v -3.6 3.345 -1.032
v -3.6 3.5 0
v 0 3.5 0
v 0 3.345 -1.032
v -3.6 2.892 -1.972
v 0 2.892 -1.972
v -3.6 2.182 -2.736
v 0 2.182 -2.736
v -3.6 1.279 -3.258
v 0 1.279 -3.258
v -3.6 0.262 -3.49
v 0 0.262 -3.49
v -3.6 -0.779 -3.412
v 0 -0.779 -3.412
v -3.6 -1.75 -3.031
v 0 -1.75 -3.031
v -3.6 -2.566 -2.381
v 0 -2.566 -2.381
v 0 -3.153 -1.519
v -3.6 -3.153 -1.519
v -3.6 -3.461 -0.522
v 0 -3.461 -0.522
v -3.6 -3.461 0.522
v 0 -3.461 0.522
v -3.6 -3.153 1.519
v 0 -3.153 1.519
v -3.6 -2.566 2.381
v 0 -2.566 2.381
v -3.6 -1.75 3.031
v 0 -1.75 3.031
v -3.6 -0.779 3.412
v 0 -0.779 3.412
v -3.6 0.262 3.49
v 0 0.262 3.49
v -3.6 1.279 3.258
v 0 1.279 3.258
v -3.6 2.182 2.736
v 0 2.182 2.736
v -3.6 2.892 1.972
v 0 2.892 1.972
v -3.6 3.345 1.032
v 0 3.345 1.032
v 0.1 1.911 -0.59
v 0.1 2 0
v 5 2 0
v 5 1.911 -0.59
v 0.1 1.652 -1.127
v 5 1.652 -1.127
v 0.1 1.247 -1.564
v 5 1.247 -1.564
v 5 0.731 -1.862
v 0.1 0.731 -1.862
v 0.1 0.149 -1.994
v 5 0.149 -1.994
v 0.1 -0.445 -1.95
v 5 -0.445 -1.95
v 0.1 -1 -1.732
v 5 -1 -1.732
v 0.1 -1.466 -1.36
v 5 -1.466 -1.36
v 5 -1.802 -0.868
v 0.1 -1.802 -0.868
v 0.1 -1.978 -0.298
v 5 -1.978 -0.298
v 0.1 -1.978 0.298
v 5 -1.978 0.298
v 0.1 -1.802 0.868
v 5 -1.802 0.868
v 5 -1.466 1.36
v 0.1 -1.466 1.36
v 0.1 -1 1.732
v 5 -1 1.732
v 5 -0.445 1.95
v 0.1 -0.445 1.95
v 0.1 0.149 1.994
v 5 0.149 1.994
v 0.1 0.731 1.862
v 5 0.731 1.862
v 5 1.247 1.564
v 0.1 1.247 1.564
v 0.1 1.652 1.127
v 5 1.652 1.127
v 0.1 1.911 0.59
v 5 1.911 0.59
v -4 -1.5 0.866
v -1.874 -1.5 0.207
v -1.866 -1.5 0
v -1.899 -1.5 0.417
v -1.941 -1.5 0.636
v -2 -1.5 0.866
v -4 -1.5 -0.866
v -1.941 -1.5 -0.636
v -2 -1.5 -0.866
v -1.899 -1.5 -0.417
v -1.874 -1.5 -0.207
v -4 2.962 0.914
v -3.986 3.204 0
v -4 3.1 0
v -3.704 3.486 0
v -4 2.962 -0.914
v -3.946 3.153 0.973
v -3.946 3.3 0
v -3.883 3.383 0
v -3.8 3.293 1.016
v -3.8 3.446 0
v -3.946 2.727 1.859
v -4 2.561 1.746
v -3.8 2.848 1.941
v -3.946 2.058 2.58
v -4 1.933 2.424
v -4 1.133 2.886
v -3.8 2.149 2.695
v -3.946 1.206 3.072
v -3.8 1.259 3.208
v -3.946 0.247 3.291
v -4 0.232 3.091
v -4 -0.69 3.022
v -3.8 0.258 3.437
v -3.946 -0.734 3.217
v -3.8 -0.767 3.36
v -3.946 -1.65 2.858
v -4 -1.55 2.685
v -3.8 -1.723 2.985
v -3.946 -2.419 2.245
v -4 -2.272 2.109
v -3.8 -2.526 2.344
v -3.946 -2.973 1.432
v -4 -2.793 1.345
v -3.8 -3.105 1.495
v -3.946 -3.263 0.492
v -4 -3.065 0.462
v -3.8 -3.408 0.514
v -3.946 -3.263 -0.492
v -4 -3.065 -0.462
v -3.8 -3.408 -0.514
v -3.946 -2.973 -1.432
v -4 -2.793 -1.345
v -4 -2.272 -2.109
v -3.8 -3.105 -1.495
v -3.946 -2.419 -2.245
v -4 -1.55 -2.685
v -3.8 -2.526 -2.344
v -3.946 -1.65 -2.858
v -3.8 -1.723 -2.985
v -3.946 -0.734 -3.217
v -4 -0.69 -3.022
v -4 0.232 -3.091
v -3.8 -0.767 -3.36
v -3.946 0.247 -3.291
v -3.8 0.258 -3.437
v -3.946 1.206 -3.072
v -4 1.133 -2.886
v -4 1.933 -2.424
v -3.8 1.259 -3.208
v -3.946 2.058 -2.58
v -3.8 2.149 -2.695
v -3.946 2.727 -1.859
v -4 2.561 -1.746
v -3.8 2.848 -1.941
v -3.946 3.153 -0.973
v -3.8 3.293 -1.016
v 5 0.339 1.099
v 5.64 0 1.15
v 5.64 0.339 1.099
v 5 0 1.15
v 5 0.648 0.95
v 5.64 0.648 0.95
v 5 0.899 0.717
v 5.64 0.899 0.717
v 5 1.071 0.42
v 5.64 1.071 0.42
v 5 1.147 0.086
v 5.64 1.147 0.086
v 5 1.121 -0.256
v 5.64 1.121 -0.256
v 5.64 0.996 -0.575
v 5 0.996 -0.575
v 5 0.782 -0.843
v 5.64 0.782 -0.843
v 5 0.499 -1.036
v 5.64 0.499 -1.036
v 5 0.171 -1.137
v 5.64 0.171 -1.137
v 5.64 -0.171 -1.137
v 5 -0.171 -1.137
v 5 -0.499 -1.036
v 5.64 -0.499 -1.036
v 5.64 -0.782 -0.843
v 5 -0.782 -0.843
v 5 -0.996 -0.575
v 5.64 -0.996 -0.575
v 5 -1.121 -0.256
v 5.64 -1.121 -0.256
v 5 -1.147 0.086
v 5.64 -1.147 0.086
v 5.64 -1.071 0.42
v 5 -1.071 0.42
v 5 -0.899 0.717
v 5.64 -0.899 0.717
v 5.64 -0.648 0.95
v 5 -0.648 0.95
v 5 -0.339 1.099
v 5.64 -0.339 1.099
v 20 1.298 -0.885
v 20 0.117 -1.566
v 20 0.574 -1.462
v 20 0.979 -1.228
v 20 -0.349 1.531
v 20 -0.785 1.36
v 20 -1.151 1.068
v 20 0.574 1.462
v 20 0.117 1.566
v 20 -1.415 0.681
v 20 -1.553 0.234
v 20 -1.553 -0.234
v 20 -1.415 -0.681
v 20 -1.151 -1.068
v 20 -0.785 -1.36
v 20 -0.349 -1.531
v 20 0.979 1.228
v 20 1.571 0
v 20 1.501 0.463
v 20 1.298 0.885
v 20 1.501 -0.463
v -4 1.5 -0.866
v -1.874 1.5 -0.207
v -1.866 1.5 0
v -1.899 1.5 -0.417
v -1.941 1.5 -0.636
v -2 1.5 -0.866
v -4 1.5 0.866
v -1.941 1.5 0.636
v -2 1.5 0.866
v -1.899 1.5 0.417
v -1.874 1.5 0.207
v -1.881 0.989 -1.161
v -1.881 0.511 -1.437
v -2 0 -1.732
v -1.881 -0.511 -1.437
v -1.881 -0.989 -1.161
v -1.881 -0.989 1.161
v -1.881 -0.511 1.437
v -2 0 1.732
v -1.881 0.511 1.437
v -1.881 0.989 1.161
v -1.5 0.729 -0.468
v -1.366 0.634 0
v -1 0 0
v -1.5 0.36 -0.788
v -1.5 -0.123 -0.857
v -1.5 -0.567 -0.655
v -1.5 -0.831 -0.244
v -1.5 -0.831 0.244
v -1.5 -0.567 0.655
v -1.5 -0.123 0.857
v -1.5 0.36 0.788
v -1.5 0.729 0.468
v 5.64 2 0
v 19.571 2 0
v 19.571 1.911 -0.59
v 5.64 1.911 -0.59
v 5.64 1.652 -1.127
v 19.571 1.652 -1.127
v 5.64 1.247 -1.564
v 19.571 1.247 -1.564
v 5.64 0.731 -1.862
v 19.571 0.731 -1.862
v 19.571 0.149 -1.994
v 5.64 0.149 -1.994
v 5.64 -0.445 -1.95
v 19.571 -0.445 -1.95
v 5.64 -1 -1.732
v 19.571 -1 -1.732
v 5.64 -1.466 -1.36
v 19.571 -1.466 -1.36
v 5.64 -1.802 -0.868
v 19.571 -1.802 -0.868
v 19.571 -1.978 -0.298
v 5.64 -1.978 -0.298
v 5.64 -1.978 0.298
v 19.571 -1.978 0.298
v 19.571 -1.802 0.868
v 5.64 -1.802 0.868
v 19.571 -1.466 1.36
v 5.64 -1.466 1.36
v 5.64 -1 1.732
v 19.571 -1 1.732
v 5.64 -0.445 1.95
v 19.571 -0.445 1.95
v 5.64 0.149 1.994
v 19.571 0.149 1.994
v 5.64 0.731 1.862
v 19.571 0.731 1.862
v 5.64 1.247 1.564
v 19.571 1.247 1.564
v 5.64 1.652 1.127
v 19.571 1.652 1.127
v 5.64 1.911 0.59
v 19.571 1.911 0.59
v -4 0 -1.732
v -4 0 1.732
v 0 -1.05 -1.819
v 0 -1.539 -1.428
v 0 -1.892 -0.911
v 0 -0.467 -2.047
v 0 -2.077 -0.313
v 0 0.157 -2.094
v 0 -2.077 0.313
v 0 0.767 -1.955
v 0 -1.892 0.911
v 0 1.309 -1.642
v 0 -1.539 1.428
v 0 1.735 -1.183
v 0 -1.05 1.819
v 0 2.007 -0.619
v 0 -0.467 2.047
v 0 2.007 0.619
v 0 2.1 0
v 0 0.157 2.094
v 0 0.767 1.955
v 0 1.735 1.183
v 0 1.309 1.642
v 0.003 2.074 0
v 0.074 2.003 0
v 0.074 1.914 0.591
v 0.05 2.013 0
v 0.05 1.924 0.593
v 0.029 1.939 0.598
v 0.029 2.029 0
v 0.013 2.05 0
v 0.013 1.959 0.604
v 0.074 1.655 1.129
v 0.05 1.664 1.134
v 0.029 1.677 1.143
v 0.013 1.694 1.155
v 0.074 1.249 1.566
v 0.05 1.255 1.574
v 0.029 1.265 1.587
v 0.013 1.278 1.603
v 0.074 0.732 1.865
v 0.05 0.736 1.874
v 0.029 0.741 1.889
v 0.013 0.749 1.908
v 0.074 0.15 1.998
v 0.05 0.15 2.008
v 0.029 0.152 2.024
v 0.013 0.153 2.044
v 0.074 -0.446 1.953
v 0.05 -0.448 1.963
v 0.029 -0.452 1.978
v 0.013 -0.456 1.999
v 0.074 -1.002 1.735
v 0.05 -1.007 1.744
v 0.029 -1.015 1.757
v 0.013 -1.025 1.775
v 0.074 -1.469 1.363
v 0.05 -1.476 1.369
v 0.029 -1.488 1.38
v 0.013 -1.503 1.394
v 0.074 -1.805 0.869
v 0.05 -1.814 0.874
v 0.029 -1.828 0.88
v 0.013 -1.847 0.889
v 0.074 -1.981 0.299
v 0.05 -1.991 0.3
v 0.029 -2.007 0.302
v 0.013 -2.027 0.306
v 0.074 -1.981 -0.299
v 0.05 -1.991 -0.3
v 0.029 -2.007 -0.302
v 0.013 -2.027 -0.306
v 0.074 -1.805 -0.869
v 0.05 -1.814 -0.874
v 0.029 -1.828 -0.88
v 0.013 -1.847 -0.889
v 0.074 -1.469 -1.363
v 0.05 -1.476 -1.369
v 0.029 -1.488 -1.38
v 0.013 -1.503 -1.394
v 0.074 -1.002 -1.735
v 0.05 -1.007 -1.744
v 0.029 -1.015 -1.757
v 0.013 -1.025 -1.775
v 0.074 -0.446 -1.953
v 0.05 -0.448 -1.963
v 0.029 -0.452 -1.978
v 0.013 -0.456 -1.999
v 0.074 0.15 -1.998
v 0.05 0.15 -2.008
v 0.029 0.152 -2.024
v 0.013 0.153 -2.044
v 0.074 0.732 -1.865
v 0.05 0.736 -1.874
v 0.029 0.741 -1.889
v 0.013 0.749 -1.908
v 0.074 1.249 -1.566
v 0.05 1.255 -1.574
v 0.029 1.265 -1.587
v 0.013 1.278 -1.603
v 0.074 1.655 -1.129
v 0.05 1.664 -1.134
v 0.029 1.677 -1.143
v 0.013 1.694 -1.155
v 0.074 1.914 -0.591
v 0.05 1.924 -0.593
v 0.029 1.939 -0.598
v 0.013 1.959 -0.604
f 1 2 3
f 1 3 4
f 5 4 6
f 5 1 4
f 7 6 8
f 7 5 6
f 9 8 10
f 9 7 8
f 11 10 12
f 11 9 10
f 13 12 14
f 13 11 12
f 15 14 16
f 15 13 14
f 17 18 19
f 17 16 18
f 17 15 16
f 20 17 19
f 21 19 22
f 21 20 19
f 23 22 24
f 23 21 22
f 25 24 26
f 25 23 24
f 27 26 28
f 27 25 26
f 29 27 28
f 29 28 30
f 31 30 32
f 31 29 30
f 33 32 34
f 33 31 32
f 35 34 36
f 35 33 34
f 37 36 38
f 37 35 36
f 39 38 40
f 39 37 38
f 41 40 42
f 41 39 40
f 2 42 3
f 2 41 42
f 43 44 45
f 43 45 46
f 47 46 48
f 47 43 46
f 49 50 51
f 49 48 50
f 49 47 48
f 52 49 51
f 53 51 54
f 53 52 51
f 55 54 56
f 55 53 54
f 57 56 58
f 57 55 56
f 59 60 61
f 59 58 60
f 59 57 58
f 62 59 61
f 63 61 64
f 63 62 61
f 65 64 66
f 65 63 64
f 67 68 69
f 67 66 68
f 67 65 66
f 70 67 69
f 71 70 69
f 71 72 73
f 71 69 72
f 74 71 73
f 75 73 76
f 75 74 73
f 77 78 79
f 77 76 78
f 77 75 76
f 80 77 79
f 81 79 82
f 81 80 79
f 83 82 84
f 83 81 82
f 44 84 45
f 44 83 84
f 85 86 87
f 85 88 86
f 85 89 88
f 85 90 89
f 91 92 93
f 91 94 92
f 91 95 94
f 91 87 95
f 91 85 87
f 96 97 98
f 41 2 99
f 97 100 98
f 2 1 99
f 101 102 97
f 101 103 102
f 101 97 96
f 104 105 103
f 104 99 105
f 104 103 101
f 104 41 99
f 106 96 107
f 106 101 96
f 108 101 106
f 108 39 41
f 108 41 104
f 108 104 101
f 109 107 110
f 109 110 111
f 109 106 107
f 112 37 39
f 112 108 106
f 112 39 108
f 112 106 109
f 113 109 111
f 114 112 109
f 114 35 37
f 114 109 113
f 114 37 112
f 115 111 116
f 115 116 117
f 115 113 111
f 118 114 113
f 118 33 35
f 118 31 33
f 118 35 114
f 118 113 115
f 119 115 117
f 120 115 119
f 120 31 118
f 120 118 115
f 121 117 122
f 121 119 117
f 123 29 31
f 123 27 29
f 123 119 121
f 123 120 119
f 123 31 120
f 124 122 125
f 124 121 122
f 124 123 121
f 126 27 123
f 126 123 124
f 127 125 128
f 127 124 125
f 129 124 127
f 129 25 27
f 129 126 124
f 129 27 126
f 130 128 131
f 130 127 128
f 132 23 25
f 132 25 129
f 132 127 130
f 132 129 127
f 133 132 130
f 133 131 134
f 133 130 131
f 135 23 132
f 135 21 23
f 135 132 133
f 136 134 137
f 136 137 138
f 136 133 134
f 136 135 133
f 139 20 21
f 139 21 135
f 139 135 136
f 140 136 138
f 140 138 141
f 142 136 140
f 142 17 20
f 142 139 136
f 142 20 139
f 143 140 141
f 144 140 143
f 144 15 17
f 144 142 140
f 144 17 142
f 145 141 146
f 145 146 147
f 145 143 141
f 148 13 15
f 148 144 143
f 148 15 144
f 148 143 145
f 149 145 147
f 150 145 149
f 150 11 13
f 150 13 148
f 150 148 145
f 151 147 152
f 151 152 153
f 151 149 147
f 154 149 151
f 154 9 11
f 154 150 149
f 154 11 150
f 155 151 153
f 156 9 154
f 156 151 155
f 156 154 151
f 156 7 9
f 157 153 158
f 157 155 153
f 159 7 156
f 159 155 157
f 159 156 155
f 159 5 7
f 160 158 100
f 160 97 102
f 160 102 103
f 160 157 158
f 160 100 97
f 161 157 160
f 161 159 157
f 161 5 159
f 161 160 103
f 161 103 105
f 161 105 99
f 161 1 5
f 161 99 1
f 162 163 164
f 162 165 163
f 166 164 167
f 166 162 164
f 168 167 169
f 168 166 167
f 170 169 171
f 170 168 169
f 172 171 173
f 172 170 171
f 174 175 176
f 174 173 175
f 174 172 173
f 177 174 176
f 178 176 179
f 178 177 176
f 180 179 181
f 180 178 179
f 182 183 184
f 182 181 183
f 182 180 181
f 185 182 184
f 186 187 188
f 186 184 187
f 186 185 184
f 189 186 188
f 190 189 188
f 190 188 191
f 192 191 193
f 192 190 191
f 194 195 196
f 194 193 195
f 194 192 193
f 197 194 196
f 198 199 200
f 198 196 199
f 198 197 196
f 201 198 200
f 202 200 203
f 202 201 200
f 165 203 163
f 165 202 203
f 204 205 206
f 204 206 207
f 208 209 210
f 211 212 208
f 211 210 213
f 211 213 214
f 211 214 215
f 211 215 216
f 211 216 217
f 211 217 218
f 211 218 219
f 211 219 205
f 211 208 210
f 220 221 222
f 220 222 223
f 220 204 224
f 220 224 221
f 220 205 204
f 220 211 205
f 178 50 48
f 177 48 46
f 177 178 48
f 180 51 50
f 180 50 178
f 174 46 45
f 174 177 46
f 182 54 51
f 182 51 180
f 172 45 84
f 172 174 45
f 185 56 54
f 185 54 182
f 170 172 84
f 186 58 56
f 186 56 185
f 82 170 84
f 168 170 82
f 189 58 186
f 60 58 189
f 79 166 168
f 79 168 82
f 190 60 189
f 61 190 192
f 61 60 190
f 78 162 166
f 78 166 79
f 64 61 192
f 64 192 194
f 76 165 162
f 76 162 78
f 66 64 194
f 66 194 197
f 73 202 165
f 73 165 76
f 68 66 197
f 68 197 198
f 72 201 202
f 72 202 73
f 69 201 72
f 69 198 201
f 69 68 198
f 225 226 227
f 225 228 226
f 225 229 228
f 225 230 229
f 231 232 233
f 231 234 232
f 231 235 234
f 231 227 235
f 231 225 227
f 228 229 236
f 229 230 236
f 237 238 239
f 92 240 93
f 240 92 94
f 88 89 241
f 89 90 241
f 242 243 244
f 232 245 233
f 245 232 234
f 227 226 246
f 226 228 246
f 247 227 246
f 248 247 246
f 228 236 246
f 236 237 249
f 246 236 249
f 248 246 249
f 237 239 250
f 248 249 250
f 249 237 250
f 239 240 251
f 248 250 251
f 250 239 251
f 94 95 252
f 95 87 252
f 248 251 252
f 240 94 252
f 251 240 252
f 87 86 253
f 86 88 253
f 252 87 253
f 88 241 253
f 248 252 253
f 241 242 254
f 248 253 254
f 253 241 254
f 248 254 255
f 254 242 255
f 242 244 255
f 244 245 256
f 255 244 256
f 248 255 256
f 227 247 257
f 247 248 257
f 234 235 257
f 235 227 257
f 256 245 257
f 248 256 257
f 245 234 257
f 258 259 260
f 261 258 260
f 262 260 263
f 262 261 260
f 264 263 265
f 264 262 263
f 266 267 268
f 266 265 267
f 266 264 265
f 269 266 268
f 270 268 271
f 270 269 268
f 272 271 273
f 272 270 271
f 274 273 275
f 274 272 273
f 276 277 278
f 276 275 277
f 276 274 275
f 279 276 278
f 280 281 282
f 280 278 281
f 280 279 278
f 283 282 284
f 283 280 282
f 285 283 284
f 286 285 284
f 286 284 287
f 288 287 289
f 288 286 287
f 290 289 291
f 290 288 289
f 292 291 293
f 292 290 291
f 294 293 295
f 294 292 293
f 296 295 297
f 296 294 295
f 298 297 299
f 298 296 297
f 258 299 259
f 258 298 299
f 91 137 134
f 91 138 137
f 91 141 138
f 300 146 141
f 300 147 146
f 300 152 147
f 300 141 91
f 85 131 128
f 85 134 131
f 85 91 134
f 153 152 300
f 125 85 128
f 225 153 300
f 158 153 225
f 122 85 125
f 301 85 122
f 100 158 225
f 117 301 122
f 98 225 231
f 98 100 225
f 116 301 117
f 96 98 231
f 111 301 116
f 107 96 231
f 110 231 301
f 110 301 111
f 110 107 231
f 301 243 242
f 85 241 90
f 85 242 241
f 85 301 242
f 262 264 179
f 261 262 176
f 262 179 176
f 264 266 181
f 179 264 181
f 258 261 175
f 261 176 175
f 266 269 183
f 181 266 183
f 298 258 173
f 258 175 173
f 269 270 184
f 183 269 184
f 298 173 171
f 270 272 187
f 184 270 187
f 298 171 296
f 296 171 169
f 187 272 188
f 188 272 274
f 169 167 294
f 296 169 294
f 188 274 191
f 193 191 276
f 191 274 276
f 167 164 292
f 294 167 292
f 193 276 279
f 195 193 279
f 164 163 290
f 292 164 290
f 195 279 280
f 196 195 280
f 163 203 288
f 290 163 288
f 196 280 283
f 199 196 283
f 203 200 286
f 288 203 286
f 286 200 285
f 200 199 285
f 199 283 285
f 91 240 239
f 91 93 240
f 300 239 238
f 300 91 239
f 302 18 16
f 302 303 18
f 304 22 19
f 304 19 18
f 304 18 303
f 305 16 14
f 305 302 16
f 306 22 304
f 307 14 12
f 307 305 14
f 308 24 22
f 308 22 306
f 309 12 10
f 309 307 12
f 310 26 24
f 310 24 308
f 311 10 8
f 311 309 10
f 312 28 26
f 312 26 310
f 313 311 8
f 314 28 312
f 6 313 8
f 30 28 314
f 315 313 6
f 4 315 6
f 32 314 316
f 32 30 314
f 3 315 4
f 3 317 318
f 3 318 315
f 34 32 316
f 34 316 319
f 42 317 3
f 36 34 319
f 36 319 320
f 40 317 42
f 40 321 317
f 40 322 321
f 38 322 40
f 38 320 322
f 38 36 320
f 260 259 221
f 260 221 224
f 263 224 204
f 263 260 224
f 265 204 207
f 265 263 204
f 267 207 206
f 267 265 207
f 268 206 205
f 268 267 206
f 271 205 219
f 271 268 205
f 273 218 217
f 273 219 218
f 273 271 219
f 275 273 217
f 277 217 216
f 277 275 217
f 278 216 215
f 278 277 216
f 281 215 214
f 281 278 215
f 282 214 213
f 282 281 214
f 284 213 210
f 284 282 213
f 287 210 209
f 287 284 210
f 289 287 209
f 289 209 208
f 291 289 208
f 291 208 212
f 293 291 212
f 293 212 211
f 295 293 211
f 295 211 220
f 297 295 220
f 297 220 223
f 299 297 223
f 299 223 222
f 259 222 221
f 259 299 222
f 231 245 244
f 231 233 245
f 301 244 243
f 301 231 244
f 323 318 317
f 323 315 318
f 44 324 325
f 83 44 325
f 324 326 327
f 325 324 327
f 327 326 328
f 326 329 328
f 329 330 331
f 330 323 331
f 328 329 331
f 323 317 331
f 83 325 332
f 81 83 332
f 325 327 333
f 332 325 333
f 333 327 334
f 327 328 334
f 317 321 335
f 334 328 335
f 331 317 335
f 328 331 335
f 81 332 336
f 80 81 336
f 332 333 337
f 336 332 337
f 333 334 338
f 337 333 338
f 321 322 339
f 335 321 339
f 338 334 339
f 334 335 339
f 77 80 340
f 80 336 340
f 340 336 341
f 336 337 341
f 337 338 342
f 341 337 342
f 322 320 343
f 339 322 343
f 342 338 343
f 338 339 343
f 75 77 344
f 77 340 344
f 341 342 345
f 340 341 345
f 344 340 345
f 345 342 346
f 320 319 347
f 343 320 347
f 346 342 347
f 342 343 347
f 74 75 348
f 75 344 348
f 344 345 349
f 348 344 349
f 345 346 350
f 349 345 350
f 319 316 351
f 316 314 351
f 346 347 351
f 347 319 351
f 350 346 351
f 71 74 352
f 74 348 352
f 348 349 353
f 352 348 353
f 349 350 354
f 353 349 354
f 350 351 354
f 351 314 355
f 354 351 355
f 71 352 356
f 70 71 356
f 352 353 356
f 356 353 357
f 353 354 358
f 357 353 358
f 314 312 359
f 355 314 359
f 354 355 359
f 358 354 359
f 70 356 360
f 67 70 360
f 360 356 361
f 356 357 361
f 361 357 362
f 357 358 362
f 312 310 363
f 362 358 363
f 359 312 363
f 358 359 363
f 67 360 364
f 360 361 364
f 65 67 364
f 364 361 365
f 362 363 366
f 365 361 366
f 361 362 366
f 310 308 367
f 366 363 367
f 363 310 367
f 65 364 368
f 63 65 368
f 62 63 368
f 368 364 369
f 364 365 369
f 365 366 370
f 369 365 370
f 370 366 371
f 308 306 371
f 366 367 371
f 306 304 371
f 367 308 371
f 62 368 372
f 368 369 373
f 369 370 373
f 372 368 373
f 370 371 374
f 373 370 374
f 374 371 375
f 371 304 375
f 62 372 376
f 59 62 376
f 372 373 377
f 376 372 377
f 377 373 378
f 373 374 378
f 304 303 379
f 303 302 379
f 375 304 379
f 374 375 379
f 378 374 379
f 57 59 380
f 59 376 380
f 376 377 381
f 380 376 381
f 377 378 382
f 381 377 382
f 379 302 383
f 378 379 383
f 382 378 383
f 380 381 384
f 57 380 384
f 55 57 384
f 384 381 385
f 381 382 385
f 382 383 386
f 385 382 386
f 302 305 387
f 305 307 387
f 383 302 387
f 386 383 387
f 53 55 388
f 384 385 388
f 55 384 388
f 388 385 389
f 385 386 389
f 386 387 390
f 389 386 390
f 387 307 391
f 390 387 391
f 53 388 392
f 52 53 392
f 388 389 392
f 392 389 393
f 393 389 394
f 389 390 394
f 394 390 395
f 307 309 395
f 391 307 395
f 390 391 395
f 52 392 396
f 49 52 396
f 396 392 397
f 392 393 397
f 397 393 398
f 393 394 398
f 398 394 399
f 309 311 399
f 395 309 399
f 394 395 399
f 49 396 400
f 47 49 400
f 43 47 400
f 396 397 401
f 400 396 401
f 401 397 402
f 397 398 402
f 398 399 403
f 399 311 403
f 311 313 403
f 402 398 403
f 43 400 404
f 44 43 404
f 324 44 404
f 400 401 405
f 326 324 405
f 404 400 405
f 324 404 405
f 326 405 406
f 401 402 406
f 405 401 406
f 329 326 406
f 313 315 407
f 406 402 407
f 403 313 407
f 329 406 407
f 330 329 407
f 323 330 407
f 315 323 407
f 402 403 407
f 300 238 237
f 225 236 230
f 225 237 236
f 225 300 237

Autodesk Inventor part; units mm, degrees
ref_plane "YZ Plane" through (0, 0, 0) normal (1, 0, 0) x (0, 1, 0)
ref_plane "XZ Plane" through (0, 0, 0) normal (0, 1, 0) x (-1, 0, 0)
sketch "Skizze1" plane through (0, 0, 0) normal (0, 0, 1) x (1, 0, 0)
  line L0 (-1, 0) -> (20, 0)
  line L1 (20, 0) -> (20, 2)
  line L2 (20, 2) -> (1.75, 2)
  line L3 (1.75, 2) -> (1.3205, 2)
  line L4 (1.3205, 2) -> (0, 2)
  line L5 (0, 2) -> (0, 3.5)
  line L6 (0, 3.5) -> (-4, 3.5)
  line L7 (-4, 3.5) -> (-4, 1.7321)
  line L8 (-4, 1.7321) -> (-2, 1.7321)
  line L9 (-2, 1.7321) -> (-1, 0)
  line L10 (-8.8, 0) -> (24.8, 0) projected
  line L11 (0, -0.7) -> (0, 4.2) projected
  line L12 (1.75, 2) -> (0, 2) construction
  dimension "d1" = 18.25
  dimension "d2" = 0.4295
  dimension "d3" = 4
  dimension "d4" = 2
  dimension "d5" = 60
  dimension "d6" = 4
  dimension "d7" = 4
  dimension "d8" = 3.4641
  dimension "d9" = 7
  dimension "d26" = 20
revolve "Körper" add sketch "Skizze1" angle 360 about axis through (-1, 0, 0) along (1, 0, 0)
sketch "Skizze2" plane through (-4, 0, 0) normal (-1, 0, 0) x (0, 0, 1)
  circle A0 centre (0, 0) radius 1.7321 projected
  line L0 (0, -4.9) -> (0, 4.9) projected
  line L1 (-4.9, 0) -> (4.9, 0) projected
  line L2 (1.7321, 0) -> (0.866, -1.5)
  line L3 (0.866, -1.5) -> (-0.866, -1.5)
  line L4 (-0.866, -1.5) -> (-1.7321, 0)
  line L5 (-1.7321, 0) -> (-0.866, 1.5)
  line L6 (-0.866, 1.5) -> (0.866, 1.5)
  line L7 (0.866, 1.5) -> (1.7321, 0)
extrude "Loch" add sketch "Skizze2" against normal up to next contours L7 A0 | A0 L2 | L6 L0 A0 | A0 L0 L3 | L0 L6 A0 | A0 L3 L0 | L4 A0 | A0 L5
fillet "Rundung1" radius 0.4 1 edges at (-4, -3.5, 0)
thread "Gewinde" size "M4x0.7" class "6g" standard "ISO Metric profile" length 18.25
chamfer "Fase1" distance 0.4294 distance2 0.4294 1 edges at (20, -2, 0) measured on face at (20, 0.0679, 1.2634)
ref_plane "Work Plane1" through (29, 0, 0) normal (0, -1, 0) x (1, 0, 0)
fillet "Fillet2" radius 0.1 1 edges at (0, -2, 0)
sketch "Skizze4" plane through (0, 0, 0) normal (0, 1, 0) x (-1, 0, 0)
  line L0 (8.8, 0) -> (-24.8, 0) projected
  line L1 (-5, 2) -> (-5.64, 2)
  line L2 (-5.64, 2) -> (-5.64, 1.15)
  line L3 (-5.64, 1.15) -> (-5, 1.15)
  line L4 (-5, 1.15) -> (-5, 2)
  line L5 (-0.1, 2) -> (-19.5706, 2) projected
  line L6 (0, 3.5) -> (0, -3.5) projected
  line L7 (3.6, -3.5) -> (3.6, 3.5) projected
  point P0 (0, 0)
  dimension "d31" = 5
  dimension "d32" = 0.64
  dimension "d33" = 2.3
revolve "Umdrehung2" cut sketch "Skizze4" angle 360 about axis through (-10, 0, 0) along (1, 0, 0)
equation "\"d30\" = R"
equation "\"d17\" = RR"
equation "\"d13\" = GEL"
equation "\"d15\" = -0.5 * SPD + 0.5 * GD"
equation "\"d16\" = GUL"
equation "\"d1\" = GEL"
equation "\"d3\" = KOH"
equation "\"d4\" = INTI"
equation "\"d6\" = GD"
equation "\"d7\" = BDM"
equation "\"d8\" = 1.1547 * SW"
equation "\"d9\" = KOD"
equation "\"d26\" = NLG"
equation "\"GD\" = 4"
equation "\"NLG\" = 20"
equation "\"GEL\" = 18.25"
equation "\"KOD\" = 7"
equation "\"KOH\" = 4"
equation "\"INTI\" = 2"
equation "\"GAL\" = 0.61345 * PTC"
equation "\"GUL\" = 0.61345 * PTC"
equation "\"BDM\" = NND"
equation "\"SW\" = 3"
equation "\"RR\" = 0.4"
equation "\"SPD\" = NND - 1.2269 * PTC"
equation "\"R\" = 0.1"
equation "\"TOA\" = 30deg"
equation "\"GD1\" = THREADDIA - 1.2269 * PTC"
equation "\"THREADDIA\" = 4"
equation "\"FAWI\" = 45deg"
equation "\"PTC\" = 0.7"
equation "\"NND\" = 4"
equation "\"E0\" = 1.155 * SW"
properties part number "ISO 4762 - M4 x 20" material "EdelStahl - 440C"
